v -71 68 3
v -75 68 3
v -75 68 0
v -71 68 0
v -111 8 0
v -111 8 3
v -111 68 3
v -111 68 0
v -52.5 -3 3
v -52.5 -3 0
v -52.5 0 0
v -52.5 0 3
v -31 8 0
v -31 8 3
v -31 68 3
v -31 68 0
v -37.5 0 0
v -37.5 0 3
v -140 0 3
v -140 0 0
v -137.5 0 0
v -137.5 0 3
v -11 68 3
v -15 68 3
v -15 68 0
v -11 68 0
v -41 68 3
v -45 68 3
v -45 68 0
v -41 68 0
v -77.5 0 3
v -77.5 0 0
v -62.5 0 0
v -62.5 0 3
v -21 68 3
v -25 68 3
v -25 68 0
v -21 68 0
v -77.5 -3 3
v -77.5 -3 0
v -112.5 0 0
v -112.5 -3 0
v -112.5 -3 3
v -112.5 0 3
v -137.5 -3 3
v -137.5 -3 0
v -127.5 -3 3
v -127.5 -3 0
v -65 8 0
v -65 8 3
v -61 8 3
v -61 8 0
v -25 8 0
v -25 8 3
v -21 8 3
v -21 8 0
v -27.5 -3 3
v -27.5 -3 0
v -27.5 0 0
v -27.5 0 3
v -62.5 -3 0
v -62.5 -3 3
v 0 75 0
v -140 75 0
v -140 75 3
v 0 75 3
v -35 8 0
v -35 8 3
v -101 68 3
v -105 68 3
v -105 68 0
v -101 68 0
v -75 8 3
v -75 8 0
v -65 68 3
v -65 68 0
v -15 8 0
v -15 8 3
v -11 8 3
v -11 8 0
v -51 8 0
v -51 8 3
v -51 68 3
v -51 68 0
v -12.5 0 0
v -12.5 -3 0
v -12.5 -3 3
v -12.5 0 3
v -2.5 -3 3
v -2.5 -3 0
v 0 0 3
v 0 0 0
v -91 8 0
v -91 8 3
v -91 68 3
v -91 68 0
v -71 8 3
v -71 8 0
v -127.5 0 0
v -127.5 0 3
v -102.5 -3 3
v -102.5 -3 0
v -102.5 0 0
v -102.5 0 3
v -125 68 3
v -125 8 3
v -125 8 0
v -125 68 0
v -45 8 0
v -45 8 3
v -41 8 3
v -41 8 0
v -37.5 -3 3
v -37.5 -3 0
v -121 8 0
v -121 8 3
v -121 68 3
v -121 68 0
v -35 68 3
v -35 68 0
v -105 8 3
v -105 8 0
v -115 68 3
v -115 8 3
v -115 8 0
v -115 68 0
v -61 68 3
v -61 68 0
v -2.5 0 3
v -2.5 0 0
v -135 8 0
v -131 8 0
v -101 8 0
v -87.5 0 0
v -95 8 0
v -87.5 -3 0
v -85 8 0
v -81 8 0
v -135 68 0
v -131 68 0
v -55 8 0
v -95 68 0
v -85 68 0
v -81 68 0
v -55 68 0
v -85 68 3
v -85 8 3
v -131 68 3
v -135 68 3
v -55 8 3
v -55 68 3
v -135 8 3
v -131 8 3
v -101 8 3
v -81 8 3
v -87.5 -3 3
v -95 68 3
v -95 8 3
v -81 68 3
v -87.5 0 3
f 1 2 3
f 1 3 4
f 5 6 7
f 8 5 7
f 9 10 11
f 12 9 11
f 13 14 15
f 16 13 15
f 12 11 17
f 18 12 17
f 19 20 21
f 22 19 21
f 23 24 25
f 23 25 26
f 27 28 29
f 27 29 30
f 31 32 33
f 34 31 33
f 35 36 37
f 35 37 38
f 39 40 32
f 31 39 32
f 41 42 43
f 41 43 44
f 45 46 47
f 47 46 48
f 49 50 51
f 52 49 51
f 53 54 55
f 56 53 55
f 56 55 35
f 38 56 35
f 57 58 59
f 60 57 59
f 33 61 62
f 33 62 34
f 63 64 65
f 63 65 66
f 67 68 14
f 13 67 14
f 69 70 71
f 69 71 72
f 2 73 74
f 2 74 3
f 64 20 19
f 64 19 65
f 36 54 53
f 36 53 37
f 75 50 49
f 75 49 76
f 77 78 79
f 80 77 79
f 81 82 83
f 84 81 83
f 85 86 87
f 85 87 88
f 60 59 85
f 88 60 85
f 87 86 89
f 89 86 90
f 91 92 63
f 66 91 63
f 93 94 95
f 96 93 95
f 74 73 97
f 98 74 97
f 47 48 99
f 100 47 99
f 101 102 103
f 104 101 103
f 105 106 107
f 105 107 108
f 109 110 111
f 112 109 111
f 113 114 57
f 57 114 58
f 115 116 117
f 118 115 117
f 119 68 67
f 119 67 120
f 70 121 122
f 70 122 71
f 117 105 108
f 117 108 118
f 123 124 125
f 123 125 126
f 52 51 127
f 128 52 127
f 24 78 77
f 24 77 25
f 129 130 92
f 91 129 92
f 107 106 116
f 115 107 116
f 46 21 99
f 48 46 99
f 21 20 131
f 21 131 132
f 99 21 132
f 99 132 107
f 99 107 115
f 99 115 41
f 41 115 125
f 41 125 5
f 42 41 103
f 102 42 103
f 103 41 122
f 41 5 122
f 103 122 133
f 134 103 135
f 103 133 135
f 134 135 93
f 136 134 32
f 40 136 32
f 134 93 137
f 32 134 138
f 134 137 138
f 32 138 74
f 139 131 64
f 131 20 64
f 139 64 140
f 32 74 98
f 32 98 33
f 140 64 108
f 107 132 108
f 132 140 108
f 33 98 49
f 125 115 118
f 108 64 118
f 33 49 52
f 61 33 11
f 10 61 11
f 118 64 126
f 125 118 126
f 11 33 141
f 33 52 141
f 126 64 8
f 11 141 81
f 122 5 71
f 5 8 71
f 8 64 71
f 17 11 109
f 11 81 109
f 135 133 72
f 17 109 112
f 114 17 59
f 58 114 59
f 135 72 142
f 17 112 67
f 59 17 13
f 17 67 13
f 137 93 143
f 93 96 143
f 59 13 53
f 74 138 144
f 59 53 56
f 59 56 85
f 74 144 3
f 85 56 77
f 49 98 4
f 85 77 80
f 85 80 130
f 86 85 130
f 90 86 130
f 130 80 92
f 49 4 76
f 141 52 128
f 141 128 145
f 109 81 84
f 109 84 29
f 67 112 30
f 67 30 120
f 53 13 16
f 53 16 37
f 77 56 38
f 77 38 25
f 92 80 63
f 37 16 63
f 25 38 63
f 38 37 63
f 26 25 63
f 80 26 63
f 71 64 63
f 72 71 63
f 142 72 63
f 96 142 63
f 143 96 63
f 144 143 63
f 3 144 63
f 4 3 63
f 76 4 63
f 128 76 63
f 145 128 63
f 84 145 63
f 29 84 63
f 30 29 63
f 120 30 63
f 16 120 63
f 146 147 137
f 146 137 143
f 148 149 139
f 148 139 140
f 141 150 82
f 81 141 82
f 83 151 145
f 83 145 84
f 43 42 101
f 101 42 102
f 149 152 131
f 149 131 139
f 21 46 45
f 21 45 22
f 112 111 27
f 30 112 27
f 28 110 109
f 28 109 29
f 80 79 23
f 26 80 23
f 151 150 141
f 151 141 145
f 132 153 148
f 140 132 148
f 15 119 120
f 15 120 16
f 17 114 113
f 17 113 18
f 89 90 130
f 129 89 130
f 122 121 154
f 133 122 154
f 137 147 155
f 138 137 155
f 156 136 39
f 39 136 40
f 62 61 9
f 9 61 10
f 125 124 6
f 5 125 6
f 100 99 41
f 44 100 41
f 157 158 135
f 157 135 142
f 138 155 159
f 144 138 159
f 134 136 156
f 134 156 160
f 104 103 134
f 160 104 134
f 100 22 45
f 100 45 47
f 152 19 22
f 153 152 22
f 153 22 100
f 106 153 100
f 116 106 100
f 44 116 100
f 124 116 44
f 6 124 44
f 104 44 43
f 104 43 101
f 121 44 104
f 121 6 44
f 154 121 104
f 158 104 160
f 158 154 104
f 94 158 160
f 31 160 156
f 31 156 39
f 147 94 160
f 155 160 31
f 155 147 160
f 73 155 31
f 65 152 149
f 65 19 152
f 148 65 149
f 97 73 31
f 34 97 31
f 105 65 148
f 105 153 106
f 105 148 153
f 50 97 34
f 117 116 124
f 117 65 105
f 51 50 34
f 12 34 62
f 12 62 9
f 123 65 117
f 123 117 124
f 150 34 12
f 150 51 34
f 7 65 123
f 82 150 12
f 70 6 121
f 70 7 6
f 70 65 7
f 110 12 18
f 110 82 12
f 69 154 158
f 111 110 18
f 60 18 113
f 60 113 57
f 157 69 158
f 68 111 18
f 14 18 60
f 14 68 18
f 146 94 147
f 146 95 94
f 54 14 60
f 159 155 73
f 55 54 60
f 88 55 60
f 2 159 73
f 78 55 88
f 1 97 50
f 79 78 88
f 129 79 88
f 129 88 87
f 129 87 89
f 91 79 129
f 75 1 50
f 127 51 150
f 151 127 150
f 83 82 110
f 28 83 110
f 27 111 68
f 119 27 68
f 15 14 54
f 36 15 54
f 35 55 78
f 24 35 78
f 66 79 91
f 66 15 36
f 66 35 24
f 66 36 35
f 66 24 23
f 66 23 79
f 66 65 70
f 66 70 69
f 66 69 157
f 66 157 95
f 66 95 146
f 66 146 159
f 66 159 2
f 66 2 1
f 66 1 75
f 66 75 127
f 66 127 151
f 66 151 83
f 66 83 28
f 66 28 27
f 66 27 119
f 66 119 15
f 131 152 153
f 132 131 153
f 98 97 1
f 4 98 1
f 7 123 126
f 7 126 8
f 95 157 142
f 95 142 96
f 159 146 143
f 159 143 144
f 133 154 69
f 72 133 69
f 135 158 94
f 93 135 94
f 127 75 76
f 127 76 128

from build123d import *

# Parameters (mm, degrees)
BOSS_EXTRU_1_DEPTH      = 3
ESQUISSE2_W             = 4
ESQUISSE2_H             = 60
ENL_V_MAT_EXTRU_1_DEPTH = 3


with BuildPart() as part:
    # Esquisse1 → Boss.-Extru.1 (new body)
    with BuildSketch(Plane.XY):
        Polygon((-137.5, -3), (-127.5, -3), (-127.5, 0), (-112.5, 0), (-112.5, -3), (-102.5, -3), (-102.5, 0), (-87.5, 0), (-87.5, -3), (-77.5, -3), (-77.5, 0), (-62.5, 0), (-62.5, -3), (-52.5, -3), (-52.5, 0), (-37.5, 0), (-37.5, -3), (-27.5, -3), (-27.5, 0), (-12.5, 0), (-12.5, -3), (-2.5, -3), (-2.5, 0), (0, 0), (0, 75), (-140, 75), (-140, 0), (-137.5, 0), align=None)
    extrude(amount=BOSS_EXTRU_1_DEPTH)

    # Esquisse2 → Enlèv. mat.-Extru.1 (cut)
    with BuildSketch(Plane.XY.offset(3)):
        with Locations((-133, 38)):
            Rectangle(ESQUISSE2_W, ESQUISSE2_H)
        with Locations((-123, 38)):
            Rectangle(ESQUISSE2_W, ESQUISSE2_H)
        with Locations((-113, 38)):
            Rectangle(ESQUISSE2_W, ESQUISSE2_H)
        with Locations((-103, 38)):
            Rectangle(ESQUISSE2_W, ESQUISSE2_H)
        with Locations((-93, 38)):
            Rectangle(ESQUISSE2_W, ESQUISSE2_H)
        with Locations((-83, 38)):
            Rectangle(ESQUISSE2_W, ESQUISSE2_H)
        with Locations((-73, 38)):
            Rectangle(ESQUISSE2_W, ESQUISSE2_H)
        with Locations((-63, 38)):
            Rectangle(ESQUISSE2_W, ESQUISSE2_H)
        with Locations((-53, 38)):
            Rectangle(ESQUISSE2_W, ESQUISSE2_H)
        with Locations((-43, 38)):
            Rectangle(ESQUISSE2_W, ESQUISSE2_H)
        with Locations((-33, 38)):
            Rectangle(ESQUISSE2_W, ESQUISSE2_H)
        with Locations((-23, 38)):
            Rectangle(ESQUISSE2_W, ESQUISSE2_H)
        with Locations((-13, 38)):
            Rectangle(ESQUISSE2_W, ESQUISSE2_H)
    extrude(amount=-ENL_V_MAT_EXTRU_1_DEPTH, mode=Mode.SUBTRACT)


solid = part.part
